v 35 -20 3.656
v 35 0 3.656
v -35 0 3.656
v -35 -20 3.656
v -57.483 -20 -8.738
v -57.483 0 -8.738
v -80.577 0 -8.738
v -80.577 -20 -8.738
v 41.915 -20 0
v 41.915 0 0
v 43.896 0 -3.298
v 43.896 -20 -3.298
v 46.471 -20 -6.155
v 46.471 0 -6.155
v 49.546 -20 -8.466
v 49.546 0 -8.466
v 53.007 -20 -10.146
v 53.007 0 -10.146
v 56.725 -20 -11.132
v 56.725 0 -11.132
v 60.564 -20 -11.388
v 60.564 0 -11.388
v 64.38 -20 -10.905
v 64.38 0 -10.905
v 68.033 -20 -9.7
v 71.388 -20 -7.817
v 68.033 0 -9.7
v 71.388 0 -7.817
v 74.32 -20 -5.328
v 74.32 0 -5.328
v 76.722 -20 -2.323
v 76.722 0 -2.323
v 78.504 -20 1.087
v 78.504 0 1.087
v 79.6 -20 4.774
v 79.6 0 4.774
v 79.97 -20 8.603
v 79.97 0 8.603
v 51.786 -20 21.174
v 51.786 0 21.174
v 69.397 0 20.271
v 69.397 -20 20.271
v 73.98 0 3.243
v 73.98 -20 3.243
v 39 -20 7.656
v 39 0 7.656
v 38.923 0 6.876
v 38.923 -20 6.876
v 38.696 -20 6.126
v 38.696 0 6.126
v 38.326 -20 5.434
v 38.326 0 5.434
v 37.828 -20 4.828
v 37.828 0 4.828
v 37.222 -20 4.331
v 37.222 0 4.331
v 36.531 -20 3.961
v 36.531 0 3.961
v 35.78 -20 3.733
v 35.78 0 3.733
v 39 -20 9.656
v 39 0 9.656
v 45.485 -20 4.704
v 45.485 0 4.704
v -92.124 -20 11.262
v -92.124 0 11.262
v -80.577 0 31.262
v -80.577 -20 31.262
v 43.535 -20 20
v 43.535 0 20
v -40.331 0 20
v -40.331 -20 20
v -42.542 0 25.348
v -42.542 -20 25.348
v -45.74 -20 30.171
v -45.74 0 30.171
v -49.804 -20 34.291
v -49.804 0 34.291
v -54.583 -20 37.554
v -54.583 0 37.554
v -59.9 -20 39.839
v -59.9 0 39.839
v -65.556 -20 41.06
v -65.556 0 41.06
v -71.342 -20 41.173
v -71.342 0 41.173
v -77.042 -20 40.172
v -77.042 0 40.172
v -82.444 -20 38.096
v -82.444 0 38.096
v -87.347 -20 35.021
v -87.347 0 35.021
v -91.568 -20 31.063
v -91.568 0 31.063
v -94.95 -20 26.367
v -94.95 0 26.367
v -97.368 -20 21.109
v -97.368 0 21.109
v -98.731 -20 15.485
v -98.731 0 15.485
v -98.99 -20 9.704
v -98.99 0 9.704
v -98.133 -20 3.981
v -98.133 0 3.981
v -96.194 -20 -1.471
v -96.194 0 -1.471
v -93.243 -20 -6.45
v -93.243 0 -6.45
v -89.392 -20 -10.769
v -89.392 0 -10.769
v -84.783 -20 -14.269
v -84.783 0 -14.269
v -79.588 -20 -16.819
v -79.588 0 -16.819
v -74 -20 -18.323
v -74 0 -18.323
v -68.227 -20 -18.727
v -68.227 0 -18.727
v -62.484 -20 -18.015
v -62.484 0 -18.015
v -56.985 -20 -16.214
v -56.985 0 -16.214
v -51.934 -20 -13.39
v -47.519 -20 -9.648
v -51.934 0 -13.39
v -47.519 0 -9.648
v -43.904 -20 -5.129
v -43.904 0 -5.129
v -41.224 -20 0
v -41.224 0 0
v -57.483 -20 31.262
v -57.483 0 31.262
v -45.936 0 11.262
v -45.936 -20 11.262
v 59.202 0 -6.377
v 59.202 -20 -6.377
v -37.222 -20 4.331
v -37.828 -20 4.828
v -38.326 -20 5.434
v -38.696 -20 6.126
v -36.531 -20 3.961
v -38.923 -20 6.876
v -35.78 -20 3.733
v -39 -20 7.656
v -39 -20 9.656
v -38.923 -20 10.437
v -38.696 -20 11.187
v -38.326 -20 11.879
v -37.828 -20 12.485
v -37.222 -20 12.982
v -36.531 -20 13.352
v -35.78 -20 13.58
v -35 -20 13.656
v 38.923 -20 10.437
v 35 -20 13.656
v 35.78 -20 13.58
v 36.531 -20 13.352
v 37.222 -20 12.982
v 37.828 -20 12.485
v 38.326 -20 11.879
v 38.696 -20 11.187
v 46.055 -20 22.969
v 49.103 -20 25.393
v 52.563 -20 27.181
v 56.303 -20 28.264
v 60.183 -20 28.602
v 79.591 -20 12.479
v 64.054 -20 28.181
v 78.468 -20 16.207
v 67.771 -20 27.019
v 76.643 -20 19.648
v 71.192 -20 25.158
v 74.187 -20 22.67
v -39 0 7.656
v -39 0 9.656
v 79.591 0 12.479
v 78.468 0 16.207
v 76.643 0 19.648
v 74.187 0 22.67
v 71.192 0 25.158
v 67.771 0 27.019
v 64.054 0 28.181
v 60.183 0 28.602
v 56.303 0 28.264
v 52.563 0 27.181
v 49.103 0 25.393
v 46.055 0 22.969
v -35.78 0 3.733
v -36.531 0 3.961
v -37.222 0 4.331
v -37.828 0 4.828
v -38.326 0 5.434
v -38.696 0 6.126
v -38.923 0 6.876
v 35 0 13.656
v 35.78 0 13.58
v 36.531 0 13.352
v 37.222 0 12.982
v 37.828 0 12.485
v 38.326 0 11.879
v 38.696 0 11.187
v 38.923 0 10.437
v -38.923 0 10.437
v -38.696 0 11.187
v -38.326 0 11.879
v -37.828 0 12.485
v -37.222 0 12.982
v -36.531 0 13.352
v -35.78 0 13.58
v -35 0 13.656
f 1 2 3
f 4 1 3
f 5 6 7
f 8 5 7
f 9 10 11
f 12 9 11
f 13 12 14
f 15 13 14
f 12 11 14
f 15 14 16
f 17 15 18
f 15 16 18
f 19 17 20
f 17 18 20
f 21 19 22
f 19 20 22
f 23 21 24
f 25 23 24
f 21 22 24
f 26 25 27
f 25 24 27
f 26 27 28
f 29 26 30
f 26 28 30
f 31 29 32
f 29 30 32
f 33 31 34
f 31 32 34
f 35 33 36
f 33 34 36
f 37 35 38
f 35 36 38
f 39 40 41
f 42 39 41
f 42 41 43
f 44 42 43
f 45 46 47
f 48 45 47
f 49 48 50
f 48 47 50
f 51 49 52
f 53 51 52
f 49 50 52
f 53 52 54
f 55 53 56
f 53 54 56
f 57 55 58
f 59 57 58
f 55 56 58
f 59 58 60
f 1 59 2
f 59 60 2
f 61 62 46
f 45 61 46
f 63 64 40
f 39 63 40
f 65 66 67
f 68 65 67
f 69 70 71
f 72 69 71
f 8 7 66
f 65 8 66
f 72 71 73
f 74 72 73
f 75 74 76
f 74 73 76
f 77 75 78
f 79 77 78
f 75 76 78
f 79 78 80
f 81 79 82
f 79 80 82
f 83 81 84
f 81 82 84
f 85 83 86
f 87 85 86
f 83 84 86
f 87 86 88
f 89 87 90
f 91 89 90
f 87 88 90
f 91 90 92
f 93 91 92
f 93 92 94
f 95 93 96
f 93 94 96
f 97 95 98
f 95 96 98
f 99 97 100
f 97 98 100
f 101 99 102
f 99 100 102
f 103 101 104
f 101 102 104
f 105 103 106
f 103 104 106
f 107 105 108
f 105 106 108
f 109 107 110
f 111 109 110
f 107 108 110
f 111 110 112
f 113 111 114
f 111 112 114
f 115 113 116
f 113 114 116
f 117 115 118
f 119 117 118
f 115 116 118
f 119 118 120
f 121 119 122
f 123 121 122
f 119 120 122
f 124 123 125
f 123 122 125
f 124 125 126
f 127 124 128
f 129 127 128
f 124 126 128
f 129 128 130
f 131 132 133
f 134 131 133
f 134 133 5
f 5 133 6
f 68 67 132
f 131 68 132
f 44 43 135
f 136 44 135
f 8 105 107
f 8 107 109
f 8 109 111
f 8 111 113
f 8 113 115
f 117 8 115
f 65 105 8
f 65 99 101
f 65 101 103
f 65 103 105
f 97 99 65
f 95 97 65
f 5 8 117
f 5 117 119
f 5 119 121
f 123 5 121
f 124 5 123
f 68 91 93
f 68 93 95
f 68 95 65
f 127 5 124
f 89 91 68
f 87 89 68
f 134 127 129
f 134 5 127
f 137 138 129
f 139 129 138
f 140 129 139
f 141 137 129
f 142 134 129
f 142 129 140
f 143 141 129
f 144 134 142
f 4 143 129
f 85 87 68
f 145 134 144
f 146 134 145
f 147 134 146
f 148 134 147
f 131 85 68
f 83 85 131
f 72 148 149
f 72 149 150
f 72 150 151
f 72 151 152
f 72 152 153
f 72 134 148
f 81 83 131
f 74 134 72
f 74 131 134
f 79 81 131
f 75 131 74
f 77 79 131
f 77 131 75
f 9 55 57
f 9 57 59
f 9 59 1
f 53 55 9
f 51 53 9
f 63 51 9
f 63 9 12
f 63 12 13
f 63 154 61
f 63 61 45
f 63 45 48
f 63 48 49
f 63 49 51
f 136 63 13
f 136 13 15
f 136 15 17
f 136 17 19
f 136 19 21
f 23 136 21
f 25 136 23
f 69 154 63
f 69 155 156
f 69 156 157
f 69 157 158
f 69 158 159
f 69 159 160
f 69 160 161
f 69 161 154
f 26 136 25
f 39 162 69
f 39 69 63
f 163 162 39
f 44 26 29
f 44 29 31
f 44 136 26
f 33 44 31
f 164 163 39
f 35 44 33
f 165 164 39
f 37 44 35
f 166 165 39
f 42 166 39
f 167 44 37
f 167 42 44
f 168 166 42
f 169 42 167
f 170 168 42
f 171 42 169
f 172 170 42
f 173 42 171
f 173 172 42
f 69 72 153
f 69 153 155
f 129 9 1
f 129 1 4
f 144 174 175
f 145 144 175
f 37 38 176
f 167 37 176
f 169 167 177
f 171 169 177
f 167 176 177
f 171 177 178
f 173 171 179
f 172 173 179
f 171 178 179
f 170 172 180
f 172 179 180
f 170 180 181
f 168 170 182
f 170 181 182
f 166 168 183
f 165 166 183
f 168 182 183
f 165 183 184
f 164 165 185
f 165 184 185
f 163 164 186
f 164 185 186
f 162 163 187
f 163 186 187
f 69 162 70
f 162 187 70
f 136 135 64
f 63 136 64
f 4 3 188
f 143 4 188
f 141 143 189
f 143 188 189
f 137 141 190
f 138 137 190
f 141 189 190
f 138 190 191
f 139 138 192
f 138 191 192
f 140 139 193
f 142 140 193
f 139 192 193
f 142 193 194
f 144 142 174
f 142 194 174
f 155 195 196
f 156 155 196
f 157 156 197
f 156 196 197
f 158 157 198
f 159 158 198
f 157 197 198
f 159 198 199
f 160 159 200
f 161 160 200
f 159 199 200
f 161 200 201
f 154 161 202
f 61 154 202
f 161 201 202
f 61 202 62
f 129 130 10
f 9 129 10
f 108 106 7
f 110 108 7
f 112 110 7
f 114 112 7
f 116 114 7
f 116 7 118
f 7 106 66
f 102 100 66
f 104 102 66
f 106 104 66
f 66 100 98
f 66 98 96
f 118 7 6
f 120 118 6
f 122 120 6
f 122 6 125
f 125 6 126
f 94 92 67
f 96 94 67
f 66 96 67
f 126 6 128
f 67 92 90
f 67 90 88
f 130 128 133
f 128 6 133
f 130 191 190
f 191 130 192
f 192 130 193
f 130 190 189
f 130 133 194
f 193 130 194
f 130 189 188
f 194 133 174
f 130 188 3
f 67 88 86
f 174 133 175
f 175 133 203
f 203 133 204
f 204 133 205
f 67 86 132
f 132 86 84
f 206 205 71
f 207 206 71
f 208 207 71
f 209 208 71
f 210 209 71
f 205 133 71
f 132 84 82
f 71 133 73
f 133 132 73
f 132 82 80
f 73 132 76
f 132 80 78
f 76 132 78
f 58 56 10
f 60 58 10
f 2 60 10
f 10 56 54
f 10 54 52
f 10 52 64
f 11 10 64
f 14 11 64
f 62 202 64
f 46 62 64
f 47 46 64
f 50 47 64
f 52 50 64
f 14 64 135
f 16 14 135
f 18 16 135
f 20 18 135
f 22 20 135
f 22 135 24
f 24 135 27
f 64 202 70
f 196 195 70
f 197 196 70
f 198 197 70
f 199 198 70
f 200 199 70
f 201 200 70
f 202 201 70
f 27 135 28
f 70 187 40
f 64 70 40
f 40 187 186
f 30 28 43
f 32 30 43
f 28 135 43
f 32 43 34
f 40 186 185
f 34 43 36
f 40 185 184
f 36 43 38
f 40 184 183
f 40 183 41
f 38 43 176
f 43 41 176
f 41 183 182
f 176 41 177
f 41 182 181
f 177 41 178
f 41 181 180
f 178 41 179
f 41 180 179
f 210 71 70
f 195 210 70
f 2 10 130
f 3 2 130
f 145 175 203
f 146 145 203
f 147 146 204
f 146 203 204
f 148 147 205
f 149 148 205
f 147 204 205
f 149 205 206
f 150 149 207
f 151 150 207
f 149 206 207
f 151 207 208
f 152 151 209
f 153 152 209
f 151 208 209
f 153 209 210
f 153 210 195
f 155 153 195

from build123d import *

# Parameters (mm, degrees)
F1_DEPTH = 20


with BuildPart() as f1:
    # F0 (on Front) → F1 (new body)
    with BuildSketch(Plane.XZ):
        with BuildLine():
            ThreePointArc((79.969927, 8.602908), (65.940764, 27.690839), (43.535016, 20))
            ThreePointArc((43.535016, 20), (40.035238, 10.217898), (41.914734, 0))
            ThreePointArc((41.914734, 0), (64.379924, -10.904832), (79.969927, 8.602908))
        make_face()
        Polygon((51.786245, 21.173801), (69.39666, 20.270671), (73.97965, 3.243089), (59.201679, -6.377406), (45.4854, 4.704383), align=None, mode=Mode.SUBTRACT)
        with BuildLine():
            ThreePointArc((-40.33078, 20), (-39.357032, 15.679199), (-39.030073, 11.262118))
            ThreePointArc((-39.030073, 11.262118), (-39.583722, 5.525184), (-41.224234, 0))
            Line((-41.224234, 0), (41.914734, 0))
            ThreePointArc((41.914734, 0), (40.035238, 10.217898), (43.535016, 20))
            Line((43.535016, 20), (-40.33078, 20))
        make_face()
        with BuildLine():
            ThreePointArc((-39, 9.656477), (-37.828427, 12.484904), (-35, 13.656477))
            Line((-35, 13.656477), (35, 13.656477))
            ThreePointArc((35, 13.656477), (37.828427, 12.484904), (39, 9.656477))
            Line((39, 9.656477), (39, 7.656477))
            ThreePointArc((39, 7.656477), (37.828427, 4.828049), (35, 3.656477))
            Line((35, 3.656477), (-35, 3.656477))
            ThreePointArc((-35, 3.656477), (-37.828427, 4.828049), (-39, 7.656477))
            Line((-39, 7.656477), (-39, 9.656477))
        make_face(mode=Mode.SUBTRACT)
        with BuildLine():
            ThreePointArc((-41.224234, 0), (-39.583722, 5.525184), (-39.030073, 11.262118))
            ThreePointArc((-39.030073, 11.262118), (-39.357032, 15.679199), (-40.33078, 20))
            ThreePointArc((-40.33078, 20), (-99.000183, 12.600964), (-41.224234, 0))
        make_face()
        Polygon((-92.124084, 11.262118), (-80.577079, 31.262118), (-57.483068, 31.262118), (-45.936063, 11.262118), (-57.483068, -8.737882), (-80.577079, -8.737882), align=None, mode=Mode.SUBTRACT)
    extrude(amount=F1_DEPTH)


solid = f1.part
